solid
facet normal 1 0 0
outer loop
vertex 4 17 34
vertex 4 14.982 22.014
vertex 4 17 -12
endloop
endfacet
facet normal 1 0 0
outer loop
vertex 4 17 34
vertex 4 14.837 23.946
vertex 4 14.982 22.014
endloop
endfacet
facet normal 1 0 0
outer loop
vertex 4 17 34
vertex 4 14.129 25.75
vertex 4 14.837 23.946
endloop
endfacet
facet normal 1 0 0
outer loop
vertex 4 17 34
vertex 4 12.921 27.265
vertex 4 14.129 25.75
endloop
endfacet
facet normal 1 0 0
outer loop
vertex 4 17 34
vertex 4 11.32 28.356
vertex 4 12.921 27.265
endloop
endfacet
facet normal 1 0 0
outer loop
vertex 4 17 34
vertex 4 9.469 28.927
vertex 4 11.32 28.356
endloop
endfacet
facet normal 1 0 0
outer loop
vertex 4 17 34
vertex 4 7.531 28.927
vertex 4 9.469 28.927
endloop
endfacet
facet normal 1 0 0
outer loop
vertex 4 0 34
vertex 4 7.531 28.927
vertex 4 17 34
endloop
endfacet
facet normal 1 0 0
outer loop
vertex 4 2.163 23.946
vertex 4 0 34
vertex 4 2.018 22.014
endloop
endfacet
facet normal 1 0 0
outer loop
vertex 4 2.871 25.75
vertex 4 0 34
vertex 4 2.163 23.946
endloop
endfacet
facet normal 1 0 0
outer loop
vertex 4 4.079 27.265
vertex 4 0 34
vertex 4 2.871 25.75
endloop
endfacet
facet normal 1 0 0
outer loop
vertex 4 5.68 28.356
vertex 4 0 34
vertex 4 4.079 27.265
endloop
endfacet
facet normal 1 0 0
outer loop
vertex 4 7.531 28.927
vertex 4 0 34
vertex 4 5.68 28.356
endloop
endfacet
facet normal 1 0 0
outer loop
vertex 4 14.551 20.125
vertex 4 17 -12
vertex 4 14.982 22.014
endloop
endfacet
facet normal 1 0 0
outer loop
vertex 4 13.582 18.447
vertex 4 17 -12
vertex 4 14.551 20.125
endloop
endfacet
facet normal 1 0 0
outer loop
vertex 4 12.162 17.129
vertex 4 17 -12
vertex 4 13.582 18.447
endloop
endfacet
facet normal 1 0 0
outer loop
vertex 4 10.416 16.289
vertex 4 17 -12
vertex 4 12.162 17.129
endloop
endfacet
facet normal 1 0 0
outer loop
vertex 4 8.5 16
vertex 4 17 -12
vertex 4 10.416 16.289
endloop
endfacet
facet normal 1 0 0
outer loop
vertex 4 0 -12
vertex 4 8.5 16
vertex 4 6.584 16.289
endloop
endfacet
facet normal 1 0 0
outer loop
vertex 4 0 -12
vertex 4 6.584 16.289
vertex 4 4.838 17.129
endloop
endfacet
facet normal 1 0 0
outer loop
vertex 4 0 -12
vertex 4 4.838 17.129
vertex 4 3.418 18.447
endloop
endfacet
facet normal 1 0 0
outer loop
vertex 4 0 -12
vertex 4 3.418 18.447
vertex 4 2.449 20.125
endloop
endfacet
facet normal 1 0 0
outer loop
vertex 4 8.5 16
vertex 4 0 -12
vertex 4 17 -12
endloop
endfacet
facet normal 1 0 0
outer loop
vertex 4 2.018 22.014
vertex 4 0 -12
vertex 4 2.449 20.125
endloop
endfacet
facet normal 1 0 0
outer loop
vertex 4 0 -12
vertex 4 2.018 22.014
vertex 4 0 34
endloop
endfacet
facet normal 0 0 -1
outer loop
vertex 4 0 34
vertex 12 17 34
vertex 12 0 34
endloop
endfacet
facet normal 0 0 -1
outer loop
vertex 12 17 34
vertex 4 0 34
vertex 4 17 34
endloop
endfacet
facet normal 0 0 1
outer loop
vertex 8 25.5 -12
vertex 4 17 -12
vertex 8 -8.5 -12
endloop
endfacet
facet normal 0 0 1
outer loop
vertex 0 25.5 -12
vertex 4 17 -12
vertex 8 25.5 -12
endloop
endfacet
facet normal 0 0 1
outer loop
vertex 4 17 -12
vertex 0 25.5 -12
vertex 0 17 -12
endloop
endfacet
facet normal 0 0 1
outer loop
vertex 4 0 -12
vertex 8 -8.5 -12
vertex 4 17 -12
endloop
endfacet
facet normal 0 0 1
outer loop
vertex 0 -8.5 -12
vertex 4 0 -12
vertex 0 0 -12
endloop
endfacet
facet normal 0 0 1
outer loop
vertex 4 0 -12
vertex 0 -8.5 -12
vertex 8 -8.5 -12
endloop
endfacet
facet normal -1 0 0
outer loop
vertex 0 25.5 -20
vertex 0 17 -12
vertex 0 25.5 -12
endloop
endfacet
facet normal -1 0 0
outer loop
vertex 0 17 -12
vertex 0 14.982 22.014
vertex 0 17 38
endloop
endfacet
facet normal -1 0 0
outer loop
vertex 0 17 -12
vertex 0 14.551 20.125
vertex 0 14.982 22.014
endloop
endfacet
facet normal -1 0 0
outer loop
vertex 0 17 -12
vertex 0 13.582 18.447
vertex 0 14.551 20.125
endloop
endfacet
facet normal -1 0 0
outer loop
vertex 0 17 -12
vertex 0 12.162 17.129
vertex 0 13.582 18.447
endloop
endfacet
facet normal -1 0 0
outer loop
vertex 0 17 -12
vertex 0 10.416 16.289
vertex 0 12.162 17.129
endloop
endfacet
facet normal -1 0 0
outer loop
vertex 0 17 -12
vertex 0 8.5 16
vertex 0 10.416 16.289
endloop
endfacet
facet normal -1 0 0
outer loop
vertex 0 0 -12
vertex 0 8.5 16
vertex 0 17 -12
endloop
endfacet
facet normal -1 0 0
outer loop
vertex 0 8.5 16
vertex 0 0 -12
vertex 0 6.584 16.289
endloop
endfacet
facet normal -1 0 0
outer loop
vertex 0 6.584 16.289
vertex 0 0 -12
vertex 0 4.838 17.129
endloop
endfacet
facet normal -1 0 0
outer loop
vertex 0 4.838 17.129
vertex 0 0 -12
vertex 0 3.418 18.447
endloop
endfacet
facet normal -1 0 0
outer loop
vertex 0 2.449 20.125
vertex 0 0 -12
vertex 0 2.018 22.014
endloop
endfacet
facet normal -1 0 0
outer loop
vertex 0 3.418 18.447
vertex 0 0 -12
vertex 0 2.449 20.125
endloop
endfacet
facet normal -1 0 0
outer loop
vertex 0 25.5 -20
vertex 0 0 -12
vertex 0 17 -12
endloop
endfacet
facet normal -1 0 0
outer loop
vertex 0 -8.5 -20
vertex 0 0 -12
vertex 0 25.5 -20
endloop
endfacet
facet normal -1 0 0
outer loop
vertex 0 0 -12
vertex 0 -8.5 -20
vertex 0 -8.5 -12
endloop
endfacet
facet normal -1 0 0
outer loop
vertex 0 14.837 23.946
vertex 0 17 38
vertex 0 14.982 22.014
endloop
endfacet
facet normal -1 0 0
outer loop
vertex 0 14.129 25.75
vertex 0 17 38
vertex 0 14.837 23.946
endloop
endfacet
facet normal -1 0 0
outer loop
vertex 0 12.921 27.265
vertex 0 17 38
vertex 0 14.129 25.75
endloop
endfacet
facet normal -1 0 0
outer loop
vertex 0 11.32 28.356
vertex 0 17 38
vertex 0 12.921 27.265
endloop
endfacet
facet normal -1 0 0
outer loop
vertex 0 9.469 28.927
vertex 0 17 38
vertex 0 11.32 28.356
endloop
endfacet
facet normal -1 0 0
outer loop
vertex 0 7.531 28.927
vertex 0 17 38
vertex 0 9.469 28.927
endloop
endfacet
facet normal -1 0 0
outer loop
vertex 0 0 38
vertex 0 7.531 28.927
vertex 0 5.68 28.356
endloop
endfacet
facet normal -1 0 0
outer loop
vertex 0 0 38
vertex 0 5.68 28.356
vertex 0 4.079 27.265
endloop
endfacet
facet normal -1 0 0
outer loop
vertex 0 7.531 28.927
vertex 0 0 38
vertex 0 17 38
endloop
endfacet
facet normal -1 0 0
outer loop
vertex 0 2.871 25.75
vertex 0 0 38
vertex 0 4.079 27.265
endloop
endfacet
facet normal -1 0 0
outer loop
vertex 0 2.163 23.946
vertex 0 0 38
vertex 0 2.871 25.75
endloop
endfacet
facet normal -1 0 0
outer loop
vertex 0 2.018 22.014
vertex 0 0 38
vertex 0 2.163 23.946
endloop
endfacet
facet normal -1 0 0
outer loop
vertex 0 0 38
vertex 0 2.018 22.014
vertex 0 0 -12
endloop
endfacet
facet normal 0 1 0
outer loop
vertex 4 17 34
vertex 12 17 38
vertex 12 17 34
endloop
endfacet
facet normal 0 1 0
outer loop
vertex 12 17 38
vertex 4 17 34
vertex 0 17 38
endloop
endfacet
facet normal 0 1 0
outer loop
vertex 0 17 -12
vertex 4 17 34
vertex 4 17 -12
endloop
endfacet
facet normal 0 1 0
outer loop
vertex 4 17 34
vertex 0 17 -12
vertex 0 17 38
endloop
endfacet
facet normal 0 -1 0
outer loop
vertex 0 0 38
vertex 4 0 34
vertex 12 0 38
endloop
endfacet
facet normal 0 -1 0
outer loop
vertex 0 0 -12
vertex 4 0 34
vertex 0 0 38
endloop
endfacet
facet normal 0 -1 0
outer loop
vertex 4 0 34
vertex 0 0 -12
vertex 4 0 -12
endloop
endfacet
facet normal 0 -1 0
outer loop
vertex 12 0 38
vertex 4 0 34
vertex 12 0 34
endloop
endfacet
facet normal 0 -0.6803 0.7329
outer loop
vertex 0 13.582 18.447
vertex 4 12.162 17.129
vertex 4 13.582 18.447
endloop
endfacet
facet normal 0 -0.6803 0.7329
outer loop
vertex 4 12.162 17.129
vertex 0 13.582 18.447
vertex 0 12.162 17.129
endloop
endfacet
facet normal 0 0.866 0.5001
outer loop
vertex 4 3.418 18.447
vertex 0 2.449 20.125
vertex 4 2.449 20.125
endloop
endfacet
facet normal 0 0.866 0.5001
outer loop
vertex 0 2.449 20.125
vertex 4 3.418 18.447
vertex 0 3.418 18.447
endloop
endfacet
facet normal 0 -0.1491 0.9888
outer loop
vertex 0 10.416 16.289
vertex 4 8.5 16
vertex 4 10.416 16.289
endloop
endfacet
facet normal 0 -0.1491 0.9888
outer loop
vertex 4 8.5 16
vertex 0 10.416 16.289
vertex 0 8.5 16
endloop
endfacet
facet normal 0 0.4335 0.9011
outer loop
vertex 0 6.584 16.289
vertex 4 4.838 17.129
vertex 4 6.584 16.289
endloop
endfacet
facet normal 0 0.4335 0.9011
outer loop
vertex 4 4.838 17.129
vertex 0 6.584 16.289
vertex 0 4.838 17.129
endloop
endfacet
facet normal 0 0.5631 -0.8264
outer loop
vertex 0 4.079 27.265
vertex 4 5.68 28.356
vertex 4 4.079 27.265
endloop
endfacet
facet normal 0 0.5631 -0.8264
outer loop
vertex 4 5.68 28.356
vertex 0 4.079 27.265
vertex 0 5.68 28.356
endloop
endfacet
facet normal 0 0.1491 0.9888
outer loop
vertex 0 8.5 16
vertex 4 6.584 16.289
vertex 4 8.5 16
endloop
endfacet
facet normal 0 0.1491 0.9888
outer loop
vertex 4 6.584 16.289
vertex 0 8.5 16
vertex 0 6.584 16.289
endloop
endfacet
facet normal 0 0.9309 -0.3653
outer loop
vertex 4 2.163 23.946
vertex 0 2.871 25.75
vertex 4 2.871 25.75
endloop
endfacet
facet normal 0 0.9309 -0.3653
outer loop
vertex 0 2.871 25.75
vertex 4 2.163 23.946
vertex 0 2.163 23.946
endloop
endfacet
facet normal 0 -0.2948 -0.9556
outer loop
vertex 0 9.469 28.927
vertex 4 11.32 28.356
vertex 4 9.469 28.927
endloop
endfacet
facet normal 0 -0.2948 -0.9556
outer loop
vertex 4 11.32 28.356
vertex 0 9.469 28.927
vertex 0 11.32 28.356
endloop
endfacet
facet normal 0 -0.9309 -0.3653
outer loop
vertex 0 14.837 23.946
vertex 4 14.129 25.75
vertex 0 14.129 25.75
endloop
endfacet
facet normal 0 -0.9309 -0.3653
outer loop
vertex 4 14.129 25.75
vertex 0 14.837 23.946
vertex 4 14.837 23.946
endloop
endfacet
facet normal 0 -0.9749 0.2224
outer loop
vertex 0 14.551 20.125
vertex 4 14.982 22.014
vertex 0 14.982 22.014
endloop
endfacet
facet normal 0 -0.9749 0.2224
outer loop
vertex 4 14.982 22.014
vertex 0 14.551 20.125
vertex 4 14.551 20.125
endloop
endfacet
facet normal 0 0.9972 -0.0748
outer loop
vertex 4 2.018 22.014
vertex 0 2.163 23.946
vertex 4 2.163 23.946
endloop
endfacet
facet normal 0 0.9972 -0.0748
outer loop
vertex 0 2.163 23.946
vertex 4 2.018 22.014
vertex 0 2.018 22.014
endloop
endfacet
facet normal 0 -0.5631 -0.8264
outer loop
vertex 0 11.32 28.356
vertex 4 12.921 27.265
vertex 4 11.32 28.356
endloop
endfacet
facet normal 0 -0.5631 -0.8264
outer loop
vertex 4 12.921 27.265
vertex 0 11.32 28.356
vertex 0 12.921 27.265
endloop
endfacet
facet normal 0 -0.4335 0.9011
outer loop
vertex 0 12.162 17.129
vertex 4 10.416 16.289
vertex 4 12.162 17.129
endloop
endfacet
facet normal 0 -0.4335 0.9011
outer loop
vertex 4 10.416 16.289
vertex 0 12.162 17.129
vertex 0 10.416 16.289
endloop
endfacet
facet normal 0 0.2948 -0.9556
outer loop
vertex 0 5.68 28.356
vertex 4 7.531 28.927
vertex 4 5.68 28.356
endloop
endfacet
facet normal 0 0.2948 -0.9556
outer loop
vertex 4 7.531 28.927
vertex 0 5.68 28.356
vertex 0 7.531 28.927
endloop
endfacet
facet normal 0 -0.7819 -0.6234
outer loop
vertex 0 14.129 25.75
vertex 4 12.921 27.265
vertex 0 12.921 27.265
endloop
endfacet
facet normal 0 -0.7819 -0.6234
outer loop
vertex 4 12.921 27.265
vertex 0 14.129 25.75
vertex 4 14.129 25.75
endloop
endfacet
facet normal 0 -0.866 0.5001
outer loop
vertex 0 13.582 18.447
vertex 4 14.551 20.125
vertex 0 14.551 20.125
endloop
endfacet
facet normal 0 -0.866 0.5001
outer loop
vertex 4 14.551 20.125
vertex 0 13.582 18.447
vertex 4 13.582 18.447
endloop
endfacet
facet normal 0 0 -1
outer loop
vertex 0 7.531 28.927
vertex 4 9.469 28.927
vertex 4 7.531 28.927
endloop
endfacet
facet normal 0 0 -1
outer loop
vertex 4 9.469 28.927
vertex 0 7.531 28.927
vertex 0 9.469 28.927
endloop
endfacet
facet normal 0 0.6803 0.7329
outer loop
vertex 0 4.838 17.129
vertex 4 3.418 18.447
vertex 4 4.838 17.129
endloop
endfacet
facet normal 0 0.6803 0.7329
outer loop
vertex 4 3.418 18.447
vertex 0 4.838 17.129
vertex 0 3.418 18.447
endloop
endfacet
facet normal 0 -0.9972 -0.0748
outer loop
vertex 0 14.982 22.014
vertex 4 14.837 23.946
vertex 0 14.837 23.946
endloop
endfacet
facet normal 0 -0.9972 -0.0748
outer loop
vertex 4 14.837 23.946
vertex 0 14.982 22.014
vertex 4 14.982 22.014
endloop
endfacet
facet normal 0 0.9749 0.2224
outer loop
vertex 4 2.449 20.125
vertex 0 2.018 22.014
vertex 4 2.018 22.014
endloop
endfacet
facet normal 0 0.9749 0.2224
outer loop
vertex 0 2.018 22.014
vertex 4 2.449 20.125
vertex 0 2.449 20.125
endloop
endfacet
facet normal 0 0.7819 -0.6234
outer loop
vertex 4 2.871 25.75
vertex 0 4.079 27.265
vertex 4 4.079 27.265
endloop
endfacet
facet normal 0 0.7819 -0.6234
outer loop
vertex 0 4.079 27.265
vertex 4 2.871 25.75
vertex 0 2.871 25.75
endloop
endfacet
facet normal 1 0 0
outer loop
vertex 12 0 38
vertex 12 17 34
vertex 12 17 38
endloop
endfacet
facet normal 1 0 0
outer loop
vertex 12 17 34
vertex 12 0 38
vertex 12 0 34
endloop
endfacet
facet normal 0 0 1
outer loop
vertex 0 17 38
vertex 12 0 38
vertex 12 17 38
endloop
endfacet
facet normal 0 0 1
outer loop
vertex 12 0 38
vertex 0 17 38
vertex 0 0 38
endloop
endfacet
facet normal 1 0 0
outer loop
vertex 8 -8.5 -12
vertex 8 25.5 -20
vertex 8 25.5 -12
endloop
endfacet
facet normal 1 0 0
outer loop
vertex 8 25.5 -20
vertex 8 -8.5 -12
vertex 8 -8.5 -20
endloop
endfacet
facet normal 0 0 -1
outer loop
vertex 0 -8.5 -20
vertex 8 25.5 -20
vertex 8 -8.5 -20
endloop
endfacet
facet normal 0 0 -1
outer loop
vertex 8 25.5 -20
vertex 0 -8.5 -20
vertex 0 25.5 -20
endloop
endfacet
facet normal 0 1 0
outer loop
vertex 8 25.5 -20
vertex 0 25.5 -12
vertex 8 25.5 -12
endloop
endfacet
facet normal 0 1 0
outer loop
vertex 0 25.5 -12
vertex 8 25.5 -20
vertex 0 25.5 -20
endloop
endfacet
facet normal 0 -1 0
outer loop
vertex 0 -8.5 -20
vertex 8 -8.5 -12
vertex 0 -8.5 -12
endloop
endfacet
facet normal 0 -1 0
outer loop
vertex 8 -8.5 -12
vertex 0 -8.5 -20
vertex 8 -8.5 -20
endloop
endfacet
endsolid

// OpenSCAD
holedia = 13; // diameter of the hole for the jack
holeheight=22.5; // height of hole center from bottom
pedalheight=34; // total pedal height
thickness=4; // desired material thickness
boardthick=12; // board thickness
width=holedia+thickness;

// vertical part
difference() 
{
    translate([0,0,-boardthick]) cube([thickness,width,pedalheight+boardthick]);
    translate([-thickness, width/2, holeheight]) 
    {
        rotate([0,90,0])
        {
            cylinder(h=thickness*3, r=holedia/2);
        }
    }
}

// top part
translate([0,0,pedalheight]) cube([thickness*3,width,thickness]);

// bottom part
translate([0,-width/2,-boardthick-thickness*2,]) cube([thickness*2,width*2,thickness*2]);
